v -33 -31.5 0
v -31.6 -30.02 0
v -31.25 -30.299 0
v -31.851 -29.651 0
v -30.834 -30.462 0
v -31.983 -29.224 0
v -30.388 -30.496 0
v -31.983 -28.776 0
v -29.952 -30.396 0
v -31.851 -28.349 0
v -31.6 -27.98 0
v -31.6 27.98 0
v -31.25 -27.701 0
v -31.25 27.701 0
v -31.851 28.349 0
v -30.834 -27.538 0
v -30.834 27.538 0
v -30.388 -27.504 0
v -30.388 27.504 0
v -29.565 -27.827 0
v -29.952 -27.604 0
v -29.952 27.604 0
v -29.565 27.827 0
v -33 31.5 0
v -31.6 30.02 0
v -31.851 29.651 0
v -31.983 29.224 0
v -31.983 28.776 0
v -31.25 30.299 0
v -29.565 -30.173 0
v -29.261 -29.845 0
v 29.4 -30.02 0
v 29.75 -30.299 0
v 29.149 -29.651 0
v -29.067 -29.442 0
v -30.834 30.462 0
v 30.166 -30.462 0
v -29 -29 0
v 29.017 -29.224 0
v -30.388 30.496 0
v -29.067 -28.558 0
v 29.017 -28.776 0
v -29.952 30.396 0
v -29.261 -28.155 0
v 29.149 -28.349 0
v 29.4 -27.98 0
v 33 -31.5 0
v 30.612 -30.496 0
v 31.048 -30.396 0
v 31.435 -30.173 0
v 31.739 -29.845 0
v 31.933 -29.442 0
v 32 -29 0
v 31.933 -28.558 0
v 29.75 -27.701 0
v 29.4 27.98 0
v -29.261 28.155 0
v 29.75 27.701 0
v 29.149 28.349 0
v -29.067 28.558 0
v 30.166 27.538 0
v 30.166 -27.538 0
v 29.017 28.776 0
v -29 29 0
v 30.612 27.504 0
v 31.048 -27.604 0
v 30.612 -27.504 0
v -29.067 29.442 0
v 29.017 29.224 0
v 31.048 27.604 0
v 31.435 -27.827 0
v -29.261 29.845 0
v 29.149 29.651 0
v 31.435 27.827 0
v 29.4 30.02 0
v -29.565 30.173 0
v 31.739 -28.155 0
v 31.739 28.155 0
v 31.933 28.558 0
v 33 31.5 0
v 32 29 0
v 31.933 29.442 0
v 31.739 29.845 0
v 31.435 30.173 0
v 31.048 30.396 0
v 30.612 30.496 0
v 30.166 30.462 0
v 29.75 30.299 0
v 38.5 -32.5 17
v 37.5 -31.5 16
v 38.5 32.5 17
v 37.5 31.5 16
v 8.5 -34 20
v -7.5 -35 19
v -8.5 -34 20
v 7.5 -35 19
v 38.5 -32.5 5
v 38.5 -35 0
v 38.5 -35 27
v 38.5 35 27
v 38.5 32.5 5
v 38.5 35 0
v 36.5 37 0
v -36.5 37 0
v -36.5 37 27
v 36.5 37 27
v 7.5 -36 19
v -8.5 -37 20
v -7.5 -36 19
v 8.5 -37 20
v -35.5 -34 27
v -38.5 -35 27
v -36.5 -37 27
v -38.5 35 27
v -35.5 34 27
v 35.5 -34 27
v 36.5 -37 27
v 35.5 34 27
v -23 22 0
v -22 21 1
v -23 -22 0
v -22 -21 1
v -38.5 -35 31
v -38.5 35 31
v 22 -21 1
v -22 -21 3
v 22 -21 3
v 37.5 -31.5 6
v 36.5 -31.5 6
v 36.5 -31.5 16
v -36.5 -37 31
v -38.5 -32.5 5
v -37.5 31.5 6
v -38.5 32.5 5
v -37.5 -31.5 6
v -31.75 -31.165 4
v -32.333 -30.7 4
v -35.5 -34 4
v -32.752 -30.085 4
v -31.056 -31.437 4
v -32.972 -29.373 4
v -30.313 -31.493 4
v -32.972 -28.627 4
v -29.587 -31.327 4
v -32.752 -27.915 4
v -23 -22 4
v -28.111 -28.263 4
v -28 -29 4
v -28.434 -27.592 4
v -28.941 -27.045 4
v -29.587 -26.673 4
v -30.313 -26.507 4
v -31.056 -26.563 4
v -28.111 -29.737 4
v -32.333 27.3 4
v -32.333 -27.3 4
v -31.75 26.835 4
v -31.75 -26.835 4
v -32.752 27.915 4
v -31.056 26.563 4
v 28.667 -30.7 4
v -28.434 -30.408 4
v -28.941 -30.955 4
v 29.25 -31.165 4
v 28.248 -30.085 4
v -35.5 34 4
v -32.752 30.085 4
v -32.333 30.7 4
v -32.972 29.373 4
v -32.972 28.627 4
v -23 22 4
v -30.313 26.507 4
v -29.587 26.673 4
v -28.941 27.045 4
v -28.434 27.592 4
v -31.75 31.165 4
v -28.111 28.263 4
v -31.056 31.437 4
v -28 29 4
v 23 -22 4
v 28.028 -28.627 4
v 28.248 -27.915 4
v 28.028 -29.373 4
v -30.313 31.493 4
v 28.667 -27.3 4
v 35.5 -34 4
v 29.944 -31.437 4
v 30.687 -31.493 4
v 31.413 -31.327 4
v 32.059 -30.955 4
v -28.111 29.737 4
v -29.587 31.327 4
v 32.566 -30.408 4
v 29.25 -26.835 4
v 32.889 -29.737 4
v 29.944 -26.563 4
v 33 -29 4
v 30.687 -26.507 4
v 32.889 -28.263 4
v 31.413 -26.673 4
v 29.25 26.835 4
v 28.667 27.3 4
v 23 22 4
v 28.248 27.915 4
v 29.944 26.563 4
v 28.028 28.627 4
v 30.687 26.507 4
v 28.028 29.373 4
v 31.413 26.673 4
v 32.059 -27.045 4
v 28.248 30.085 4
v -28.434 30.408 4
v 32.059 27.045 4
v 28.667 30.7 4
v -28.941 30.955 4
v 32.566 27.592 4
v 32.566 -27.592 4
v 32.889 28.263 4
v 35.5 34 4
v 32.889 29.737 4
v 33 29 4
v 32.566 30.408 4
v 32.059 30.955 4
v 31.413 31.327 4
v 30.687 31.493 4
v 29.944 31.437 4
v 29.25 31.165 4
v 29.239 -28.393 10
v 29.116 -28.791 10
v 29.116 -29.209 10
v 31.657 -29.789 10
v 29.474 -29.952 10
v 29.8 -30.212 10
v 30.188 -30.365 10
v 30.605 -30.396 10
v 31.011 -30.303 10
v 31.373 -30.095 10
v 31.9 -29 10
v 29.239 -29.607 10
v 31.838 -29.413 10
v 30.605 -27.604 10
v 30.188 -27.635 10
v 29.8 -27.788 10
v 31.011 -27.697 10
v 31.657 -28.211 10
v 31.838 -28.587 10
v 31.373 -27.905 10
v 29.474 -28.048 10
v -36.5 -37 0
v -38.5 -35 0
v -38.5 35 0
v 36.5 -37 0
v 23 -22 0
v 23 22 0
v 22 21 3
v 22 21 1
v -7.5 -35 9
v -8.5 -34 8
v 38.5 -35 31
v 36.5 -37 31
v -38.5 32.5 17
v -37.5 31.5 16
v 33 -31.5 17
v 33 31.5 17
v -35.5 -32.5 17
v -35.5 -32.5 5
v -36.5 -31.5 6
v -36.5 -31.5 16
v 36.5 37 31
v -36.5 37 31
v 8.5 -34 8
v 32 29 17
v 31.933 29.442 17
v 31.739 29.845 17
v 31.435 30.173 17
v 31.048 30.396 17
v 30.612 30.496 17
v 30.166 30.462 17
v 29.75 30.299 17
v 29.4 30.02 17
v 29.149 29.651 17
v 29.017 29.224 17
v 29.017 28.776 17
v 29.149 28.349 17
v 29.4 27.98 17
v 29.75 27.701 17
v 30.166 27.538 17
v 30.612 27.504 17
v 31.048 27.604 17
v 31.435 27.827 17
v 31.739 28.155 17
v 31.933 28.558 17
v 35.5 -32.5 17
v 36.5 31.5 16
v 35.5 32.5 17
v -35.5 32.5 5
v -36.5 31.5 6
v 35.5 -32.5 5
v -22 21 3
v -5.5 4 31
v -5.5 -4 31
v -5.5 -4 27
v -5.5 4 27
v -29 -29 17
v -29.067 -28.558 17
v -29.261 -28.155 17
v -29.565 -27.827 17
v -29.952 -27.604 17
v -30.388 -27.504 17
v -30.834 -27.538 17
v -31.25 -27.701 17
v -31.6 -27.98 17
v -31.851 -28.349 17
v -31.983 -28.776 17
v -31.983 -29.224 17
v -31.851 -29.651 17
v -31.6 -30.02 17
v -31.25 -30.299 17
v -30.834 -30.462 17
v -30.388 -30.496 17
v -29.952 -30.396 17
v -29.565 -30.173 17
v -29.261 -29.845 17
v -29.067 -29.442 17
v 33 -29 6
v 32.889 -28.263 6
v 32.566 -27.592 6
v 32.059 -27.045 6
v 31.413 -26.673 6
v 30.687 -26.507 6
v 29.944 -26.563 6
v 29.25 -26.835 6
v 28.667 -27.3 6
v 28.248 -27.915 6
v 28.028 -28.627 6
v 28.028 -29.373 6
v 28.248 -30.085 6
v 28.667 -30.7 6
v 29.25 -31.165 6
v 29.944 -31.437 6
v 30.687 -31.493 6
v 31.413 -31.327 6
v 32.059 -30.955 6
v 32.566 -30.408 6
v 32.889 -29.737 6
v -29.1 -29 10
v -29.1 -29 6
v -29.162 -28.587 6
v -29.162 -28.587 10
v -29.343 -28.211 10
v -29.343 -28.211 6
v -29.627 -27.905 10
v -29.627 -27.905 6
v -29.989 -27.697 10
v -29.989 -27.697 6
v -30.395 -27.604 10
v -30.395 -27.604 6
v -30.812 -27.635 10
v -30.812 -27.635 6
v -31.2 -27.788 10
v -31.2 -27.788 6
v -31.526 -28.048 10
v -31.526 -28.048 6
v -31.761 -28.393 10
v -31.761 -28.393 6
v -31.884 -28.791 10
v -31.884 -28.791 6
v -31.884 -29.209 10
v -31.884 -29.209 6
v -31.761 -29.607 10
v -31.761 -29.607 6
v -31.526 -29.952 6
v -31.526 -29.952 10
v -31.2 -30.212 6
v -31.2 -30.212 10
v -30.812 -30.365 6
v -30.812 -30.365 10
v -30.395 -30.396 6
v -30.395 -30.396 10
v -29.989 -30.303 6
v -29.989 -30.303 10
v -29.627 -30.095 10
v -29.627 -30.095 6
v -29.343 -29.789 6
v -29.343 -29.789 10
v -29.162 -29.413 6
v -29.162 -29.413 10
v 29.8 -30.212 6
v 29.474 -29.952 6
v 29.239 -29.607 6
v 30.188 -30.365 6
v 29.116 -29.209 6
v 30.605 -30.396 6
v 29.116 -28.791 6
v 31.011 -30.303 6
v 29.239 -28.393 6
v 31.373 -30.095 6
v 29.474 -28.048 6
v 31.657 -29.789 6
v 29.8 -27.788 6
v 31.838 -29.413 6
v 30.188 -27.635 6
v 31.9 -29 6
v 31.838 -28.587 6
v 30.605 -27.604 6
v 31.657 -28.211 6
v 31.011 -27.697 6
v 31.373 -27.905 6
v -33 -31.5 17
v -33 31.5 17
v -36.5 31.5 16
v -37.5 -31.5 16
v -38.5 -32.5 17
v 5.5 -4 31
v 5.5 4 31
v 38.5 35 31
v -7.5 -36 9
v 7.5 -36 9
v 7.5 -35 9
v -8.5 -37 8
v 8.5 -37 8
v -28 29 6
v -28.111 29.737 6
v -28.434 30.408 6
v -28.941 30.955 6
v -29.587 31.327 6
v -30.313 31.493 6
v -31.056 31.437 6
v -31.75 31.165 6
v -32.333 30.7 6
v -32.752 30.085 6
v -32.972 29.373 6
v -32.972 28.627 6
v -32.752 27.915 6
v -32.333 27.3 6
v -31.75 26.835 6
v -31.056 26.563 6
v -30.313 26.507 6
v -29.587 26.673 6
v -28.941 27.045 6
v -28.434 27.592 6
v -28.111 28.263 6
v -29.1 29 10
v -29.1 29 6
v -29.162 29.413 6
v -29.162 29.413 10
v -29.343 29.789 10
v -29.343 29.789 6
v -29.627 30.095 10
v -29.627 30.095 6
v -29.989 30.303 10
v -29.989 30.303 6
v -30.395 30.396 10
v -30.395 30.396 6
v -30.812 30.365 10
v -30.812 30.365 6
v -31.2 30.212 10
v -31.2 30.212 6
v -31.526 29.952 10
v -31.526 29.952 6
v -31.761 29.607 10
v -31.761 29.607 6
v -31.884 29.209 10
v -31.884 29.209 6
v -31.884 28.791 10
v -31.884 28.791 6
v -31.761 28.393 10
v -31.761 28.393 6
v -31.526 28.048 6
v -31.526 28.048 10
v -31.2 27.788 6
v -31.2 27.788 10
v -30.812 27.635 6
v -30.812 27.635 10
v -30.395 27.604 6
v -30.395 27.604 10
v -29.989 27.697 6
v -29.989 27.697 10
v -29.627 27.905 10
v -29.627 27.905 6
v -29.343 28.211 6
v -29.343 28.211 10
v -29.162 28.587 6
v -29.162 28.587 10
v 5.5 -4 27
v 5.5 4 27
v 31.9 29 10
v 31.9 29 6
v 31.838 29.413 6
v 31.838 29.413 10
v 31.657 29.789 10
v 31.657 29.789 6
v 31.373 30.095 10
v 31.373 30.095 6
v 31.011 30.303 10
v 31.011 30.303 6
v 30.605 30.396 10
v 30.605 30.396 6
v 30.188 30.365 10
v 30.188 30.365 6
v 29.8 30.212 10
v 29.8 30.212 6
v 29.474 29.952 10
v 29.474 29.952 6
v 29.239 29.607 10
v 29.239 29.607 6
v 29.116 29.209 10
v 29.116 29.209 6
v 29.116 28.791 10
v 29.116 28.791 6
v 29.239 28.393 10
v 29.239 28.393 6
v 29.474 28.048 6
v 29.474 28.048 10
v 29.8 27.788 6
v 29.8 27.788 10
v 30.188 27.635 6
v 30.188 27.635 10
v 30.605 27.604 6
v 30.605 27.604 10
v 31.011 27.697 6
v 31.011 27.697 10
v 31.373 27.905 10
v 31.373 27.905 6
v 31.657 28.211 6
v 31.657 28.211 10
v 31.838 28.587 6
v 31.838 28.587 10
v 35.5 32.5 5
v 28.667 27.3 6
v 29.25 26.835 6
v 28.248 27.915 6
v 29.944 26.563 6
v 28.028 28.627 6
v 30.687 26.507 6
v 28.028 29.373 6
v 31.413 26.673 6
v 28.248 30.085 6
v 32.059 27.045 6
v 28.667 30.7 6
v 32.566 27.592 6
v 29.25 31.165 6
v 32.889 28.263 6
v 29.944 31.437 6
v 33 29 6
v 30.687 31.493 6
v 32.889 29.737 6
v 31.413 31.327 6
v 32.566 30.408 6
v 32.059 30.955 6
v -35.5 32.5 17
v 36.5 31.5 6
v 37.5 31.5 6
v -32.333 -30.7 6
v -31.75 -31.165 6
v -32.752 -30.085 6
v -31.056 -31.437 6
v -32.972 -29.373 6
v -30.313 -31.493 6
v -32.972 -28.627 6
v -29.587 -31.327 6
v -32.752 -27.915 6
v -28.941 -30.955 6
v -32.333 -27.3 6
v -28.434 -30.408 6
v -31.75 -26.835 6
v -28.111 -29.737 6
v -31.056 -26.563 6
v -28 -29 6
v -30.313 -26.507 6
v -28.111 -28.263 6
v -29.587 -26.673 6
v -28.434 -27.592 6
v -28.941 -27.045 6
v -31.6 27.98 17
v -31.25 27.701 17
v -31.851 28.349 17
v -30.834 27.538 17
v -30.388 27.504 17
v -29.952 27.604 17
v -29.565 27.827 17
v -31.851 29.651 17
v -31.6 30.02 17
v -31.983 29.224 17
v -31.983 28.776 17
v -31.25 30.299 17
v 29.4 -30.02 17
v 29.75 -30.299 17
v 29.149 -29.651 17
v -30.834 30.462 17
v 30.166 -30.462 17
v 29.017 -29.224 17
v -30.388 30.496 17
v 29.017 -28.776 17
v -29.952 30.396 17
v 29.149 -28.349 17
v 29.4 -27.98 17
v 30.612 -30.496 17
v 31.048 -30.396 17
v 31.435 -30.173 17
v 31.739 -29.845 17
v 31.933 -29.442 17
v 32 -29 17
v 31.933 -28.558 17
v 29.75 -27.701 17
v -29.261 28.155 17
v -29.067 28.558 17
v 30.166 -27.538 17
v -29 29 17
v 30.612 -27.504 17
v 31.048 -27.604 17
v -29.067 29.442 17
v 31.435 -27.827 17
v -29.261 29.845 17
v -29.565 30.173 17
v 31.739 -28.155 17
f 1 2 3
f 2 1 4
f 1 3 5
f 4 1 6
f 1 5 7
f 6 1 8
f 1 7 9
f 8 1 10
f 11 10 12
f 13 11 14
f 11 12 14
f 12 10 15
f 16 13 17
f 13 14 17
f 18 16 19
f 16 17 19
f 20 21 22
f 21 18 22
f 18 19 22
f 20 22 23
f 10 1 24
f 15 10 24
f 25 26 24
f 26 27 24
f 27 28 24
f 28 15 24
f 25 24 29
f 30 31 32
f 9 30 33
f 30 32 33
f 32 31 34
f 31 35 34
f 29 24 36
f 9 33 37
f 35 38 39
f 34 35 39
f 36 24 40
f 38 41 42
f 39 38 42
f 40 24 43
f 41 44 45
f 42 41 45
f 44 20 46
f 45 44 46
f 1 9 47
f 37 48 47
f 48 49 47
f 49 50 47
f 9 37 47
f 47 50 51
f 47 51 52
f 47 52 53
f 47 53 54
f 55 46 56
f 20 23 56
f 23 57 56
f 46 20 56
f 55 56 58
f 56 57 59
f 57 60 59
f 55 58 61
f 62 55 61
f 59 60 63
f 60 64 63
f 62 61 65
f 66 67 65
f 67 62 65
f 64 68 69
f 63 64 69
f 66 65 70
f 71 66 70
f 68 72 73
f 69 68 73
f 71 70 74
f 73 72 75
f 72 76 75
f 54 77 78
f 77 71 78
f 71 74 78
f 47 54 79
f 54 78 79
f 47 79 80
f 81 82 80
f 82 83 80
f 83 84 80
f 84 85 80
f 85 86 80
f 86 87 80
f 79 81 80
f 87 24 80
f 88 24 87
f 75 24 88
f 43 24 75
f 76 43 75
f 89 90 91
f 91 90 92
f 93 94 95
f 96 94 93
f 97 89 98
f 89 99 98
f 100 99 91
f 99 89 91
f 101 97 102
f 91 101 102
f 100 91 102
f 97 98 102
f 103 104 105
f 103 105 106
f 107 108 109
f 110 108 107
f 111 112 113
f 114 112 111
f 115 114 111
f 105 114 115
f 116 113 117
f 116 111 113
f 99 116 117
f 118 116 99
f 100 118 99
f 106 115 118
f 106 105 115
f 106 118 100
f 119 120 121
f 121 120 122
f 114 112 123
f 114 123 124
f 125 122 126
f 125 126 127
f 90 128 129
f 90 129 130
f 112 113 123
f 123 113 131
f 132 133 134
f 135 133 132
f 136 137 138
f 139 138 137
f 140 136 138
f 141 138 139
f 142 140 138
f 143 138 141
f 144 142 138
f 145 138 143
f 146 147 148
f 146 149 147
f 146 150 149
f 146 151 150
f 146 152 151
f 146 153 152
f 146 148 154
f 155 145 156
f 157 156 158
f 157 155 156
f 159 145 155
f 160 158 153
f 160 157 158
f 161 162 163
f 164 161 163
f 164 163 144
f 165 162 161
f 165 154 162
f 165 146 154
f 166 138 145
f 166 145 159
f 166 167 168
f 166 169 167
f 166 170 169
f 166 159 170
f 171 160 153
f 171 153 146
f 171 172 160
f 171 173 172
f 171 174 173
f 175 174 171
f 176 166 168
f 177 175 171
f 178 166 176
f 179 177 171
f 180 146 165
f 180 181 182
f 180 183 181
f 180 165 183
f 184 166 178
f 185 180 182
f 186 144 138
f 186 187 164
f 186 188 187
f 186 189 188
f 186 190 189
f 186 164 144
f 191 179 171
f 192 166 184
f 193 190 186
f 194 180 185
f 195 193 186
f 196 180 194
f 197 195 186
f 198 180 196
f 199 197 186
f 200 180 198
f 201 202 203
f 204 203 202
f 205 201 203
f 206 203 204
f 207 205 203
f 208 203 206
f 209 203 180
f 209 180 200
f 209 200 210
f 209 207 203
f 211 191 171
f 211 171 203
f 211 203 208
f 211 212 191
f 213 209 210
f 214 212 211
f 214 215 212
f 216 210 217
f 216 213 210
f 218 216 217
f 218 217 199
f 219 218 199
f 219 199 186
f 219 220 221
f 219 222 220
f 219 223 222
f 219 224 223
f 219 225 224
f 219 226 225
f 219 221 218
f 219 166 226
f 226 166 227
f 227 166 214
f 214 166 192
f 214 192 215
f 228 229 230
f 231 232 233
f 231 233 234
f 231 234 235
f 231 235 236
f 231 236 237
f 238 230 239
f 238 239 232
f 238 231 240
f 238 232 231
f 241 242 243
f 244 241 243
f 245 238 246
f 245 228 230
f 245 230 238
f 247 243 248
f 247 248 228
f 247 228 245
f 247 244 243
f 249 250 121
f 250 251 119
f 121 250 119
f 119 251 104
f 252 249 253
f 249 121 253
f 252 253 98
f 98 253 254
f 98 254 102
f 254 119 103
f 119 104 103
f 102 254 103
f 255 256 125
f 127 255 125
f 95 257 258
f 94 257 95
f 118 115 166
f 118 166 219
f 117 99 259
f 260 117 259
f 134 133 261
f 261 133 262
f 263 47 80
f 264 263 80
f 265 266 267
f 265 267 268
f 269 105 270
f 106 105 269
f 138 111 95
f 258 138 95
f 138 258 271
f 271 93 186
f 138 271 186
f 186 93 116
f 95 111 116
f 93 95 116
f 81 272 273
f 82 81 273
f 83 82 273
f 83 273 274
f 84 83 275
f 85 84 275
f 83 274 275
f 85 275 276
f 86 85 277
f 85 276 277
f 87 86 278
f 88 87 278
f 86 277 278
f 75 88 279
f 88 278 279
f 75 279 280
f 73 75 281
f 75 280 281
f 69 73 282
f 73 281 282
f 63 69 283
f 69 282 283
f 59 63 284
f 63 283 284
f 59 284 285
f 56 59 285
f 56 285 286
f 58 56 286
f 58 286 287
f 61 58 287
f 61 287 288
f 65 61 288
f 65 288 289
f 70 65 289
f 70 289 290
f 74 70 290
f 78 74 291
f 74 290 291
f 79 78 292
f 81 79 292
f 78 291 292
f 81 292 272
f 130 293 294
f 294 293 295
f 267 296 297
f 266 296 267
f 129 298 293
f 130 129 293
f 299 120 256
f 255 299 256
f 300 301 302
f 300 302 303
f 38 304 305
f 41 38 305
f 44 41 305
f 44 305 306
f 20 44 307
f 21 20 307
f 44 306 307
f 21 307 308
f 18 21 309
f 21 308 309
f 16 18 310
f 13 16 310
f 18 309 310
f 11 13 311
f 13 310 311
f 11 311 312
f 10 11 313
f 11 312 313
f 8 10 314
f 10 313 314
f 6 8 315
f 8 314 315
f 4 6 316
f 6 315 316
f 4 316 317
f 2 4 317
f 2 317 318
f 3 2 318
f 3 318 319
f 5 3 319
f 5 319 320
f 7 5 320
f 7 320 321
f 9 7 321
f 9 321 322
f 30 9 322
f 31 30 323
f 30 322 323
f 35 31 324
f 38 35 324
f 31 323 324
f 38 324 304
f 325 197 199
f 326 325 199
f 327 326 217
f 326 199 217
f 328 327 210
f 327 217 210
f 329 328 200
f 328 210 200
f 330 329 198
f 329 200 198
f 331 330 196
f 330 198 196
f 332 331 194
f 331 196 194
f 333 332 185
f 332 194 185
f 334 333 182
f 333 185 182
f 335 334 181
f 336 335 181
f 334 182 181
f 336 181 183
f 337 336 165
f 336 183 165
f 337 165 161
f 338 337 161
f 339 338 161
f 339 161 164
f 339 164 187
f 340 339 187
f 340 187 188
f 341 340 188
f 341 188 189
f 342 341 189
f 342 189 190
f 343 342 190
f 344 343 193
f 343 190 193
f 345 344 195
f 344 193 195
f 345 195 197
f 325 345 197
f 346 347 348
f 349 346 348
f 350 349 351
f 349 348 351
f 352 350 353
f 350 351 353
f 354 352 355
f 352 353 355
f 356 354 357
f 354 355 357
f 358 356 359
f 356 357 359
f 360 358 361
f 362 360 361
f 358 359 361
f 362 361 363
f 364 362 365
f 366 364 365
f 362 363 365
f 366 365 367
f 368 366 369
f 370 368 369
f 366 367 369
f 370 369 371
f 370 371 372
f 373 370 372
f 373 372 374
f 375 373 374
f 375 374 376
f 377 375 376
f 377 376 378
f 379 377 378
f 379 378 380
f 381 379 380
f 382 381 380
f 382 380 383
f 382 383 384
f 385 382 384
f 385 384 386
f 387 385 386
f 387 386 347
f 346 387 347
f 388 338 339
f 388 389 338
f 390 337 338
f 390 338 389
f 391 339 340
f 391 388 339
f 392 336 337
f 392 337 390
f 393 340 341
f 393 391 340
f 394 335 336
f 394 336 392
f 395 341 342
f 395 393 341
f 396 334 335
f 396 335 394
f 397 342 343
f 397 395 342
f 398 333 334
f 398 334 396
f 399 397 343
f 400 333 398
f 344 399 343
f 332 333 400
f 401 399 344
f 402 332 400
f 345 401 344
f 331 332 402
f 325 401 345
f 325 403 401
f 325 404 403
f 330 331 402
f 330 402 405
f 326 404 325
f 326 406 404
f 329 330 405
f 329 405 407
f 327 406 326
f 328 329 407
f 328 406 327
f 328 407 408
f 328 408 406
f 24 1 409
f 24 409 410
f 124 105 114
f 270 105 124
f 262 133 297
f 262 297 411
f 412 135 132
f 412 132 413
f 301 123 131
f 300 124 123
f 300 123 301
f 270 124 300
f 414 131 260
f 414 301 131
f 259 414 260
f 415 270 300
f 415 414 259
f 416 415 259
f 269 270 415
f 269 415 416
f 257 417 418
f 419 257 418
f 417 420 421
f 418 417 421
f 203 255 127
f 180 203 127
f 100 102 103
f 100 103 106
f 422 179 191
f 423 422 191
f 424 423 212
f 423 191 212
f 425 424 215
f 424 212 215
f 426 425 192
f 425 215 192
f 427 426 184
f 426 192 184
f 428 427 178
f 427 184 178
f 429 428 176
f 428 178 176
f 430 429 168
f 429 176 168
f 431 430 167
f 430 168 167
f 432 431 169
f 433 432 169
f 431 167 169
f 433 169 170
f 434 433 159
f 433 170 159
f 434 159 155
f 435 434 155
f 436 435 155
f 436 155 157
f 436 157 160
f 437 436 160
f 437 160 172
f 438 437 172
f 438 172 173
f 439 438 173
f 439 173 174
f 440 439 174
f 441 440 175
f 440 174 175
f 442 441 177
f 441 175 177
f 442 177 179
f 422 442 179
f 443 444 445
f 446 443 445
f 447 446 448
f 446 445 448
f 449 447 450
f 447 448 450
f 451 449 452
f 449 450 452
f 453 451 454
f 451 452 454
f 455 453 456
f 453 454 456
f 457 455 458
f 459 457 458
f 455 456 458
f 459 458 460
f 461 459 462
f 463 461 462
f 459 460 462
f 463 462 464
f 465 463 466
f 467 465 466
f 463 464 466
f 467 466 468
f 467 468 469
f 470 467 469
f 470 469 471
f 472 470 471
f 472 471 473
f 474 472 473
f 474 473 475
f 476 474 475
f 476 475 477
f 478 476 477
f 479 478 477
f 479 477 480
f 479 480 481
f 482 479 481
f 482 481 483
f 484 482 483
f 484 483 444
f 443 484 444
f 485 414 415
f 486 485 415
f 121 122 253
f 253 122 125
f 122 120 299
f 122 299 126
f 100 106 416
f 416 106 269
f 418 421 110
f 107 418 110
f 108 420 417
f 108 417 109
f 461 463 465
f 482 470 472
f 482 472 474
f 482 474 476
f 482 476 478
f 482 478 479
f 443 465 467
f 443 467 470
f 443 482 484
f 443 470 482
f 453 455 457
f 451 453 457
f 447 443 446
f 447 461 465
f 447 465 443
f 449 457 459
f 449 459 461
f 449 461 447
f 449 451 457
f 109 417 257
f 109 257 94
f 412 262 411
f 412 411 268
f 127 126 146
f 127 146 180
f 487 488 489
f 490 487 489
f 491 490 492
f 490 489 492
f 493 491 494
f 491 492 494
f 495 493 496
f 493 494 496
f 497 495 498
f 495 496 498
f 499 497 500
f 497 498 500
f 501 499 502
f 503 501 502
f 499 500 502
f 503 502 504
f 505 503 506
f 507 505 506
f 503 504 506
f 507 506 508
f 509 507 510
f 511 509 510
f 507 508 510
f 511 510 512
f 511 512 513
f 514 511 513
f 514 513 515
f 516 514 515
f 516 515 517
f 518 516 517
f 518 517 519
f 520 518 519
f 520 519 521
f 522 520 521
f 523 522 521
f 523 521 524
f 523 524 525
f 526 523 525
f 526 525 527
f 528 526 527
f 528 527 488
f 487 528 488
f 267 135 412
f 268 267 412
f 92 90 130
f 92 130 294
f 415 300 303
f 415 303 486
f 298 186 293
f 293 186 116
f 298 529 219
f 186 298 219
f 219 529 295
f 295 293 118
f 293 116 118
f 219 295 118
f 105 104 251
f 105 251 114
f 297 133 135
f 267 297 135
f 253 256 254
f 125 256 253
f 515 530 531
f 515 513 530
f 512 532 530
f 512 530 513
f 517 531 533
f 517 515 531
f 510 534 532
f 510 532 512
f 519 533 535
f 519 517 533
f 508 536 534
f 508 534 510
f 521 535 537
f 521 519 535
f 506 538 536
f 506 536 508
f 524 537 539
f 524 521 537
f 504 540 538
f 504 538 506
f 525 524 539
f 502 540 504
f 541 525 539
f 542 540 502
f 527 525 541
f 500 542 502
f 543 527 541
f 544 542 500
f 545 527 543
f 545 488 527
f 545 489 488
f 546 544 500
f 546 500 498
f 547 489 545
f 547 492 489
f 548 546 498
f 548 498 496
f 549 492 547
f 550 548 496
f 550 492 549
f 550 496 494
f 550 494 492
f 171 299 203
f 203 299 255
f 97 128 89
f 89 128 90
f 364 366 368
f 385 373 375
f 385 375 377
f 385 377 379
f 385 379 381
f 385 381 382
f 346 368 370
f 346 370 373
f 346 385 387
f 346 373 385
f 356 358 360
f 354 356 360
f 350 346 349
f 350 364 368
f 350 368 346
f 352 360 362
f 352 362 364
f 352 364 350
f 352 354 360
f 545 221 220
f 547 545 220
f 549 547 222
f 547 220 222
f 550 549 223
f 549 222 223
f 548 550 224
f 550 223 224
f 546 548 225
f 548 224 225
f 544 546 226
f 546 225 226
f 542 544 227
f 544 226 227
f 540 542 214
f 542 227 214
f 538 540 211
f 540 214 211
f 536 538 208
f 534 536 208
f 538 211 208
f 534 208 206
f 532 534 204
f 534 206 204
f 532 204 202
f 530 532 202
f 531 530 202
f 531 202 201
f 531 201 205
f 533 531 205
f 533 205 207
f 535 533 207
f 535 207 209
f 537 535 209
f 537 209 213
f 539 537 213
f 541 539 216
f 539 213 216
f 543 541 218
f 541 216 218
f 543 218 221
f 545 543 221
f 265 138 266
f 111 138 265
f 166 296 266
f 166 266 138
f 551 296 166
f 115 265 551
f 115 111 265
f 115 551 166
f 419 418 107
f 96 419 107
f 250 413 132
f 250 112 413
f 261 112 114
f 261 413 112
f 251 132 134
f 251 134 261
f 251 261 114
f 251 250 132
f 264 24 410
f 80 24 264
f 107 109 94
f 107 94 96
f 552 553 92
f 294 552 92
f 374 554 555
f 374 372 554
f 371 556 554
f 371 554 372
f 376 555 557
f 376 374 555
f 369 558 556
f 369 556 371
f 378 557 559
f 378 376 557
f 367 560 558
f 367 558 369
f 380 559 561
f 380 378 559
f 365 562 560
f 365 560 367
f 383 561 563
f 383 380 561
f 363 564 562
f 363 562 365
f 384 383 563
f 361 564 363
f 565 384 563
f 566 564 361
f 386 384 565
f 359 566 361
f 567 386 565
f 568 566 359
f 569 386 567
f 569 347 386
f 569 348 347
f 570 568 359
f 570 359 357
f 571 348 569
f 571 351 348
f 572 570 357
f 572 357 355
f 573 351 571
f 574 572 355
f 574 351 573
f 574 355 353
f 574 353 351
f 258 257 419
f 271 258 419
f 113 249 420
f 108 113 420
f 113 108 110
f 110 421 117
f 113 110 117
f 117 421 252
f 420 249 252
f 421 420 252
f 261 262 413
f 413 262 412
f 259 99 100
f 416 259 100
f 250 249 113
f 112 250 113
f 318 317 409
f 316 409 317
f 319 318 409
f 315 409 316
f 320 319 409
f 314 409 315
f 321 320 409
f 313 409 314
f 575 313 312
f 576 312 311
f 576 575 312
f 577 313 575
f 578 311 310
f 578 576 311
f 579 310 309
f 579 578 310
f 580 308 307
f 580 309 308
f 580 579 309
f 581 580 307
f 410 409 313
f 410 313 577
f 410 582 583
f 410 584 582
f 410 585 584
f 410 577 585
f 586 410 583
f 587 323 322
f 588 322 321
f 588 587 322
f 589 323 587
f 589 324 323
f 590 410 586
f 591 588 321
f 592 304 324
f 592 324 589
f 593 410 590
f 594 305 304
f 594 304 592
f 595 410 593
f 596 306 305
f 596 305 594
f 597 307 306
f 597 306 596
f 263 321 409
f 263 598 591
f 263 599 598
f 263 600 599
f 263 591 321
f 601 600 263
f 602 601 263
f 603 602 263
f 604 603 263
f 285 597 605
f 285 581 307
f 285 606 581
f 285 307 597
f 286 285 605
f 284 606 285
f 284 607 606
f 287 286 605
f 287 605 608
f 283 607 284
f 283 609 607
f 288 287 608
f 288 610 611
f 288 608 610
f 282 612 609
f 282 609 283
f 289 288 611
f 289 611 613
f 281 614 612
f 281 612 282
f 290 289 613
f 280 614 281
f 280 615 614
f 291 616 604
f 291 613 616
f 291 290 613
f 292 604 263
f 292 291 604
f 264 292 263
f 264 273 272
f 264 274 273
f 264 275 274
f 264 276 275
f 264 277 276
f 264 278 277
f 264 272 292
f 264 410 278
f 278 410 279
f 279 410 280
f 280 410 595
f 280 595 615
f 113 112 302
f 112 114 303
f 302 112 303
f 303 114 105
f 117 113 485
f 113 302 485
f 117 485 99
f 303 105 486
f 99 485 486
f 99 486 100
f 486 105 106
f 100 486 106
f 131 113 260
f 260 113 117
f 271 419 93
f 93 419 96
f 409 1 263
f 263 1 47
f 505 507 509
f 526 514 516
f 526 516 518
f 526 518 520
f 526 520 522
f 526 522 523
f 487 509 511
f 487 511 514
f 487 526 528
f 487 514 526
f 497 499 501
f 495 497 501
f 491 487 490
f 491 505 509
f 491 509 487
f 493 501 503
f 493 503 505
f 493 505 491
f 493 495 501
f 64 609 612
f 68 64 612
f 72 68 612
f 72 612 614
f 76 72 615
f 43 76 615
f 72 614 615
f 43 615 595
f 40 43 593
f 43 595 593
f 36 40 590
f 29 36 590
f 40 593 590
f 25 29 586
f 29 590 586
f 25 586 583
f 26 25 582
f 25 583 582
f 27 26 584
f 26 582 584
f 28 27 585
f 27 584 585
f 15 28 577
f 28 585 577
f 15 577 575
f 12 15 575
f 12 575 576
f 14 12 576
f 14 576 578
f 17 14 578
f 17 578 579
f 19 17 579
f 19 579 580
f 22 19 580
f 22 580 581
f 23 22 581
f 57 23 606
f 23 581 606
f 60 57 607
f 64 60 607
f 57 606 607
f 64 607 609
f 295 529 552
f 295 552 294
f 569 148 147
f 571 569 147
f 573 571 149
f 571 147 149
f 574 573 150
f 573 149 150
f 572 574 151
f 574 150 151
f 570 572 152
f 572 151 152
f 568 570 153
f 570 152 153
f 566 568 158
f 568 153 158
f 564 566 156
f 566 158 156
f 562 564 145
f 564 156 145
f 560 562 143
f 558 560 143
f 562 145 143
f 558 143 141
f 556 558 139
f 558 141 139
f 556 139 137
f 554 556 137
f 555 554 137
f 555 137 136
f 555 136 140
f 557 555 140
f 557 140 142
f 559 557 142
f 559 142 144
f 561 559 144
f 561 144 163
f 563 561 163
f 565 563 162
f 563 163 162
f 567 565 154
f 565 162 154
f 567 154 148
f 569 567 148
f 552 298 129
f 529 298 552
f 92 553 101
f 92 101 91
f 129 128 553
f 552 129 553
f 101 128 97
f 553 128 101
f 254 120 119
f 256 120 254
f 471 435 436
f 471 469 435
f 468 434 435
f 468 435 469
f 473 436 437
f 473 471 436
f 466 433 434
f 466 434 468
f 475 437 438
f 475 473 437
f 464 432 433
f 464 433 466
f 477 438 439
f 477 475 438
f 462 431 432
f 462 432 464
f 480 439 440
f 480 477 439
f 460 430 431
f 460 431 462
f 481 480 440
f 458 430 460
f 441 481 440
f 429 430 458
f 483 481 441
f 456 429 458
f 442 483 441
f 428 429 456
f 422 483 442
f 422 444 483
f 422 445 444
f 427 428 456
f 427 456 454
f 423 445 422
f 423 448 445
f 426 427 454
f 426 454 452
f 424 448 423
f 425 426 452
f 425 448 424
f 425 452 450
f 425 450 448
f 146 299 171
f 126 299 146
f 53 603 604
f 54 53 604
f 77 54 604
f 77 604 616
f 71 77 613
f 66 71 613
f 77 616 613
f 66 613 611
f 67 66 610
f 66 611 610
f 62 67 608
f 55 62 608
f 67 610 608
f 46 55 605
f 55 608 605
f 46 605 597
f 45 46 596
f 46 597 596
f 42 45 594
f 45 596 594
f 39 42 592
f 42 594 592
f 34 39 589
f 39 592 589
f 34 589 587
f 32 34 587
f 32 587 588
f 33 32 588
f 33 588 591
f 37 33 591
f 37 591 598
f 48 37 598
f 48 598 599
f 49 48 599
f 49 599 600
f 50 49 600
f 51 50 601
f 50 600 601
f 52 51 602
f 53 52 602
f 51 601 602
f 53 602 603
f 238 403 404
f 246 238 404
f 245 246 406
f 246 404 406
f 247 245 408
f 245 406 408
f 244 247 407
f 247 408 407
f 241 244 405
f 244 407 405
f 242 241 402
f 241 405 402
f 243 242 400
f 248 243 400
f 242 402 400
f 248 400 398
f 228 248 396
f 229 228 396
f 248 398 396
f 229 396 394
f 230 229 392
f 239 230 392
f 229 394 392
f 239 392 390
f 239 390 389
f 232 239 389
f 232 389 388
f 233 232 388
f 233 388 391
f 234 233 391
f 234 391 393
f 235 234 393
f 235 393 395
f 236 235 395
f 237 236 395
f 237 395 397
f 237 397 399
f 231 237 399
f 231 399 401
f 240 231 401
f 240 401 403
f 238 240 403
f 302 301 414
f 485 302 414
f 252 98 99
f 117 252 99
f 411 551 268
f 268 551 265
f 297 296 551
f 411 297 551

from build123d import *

# Parameters (mm, degrees)
SKETCH_W        = 66
SKETCH_H        = 63
PAD_DEPTH       = 17
SKETCH001_R     = 1.5
POCKET_DEPTH    = 17
SKETCH002_R     = 1.5
POCKET001_DEPTH = 17
SKETCH003_R     = 1.5
POCKET002_DEPTH = 17
SKETCH004_R     = 1.5
POCKET003_DEPTH = 17
SKETCH005_W     = 77
SKETCH005_H     = 74
PAD001_DEPTH    = 27
SKETCH006_W     = 71
SKETCH006_H     = 68
POCKET004_DEPTH = 23
SKETCH007_R     = 2.5
PAD002_DEPTH    = 2
SKETCH008_R     = 2.5
PAD003_DEPTH    = 2
SKETCH009_R     = 2.5
PAD004_DEPTH    = 2
SKETCH010_R     = 2.5
PAD005_DEPTH    = 2
SKETCH011_R     = 1.4
PAD006_DEPTH    = 6
SKETCH012_R     = 1.4
PAD007_DEPTH    = 6
SKETCH013_R     = 1.4
PAD008_DEPTH    = 6
SKETCH014_R     = 1.4
PAD009_DEPTH    = 6
SKETCH015_W     = 63
SKETCH015_H     = 10
POCKET005_DEPTH = 3
SKETCH016_W     = 63
SKETCH016_H     = 10
POCKET006_DEPTH = 3
SKETCH017_W     = 15
SKETCH017_H     = 10
POCKET007_DEPTH = 3
SKETCH018_W     = 44
SKETCH018_H     = 42
POCKET008_DEPTH = 4
CHAMFER_SIZE    = 1
CHAMFER001_SIZE = 2
CHAMFER002_SIZE = 1
CHAMFER003_SIZE = 1
SKETCH019_W     = 77
SKETCH019_H     = 74
PAD010_DEPTH    = 4
CHAMFER004_SIZE = 2
SKETCH020_W     = 11
SKETCH020_H     = 8
POCKET009_DEPTH = 4


with BuildPart() as esp32_bb:
    # Sketch → Pad (new body)
    with BuildSketch(Plane.XY):
        Rectangle(SKETCH_W, SKETCH_H)
    extrude(amount=PAD_DEPTH)

    # Sketch001 (on Face6 of Pad) → Pocket (cut)
    with BuildSketch(Plane.XY.offset(17)):
        with Locations((30.5, 29)):
            Circle(SKETCH001_R)
    extrude(amount=-POCKET_DEPTH, mode=Mode.SUBTRACT)

    # Sketch002 (on Face5 of Pocket) → Pocket001 (cut)
    with BuildSketch(Plane.XY.offset(17)):
        with Locations((30.5, -29)):
            Circle(SKETCH002_R)
    extrude(amount=-POCKET001_DEPTH, mode=Mode.SUBTRACT)

    # Sketch003 (on Face5 of Pocket001) → Pocket002 (cut)
    with BuildSketch(Plane.XY.offset(17)):
        with Locations((-30.5, -29)):
            Circle(SKETCH003_R)
    extrude(amount=-POCKET002_DEPTH, mode=Mode.SUBTRACT)

    # Sketch004 (on Face5 of Pocket002) → Pocket003 (cut)
    with BuildSketch(Plane.XY.offset(17)):
        with Locations((-30.5, 29)):
            Circle(SKETCH004_R)
    extrude(amount=-POCKET003_DEPTH, mode=Mode.SUBTRACT)


with BuildPart() as esp32_housing:
    # Sketch005 → Pad001 (new body)
    with BuildSketch(Plane.XY):
        Rectangle(SKETCH005_W, SKETCH005_H)
    extrude(amount=PAD001_DEPTH)

    # Sketch006 (on Face6 of Pad001) → Pocket004 (cut)
    with BuildSketch(Plane.XY.offset(27)):
        Rectangle(SKETCH006_W, SKETCH006_H)
    extrude(amount=-POCKET004_DEPTH, mode=Mode.SUBTRACT)

    # Sketch007 (on Face11 of Pocket004) → Pad002 (join)
    with BuildSketch(Plane.XY.offset(4)):
        with Locations((30.5, 29)):
            Circle(SKETCH007_R)
    extrude(amount=PAD002_DEPTH)

    # Sketch008 (on Face11 of Pocket004) → Pad003 (join)
    with BuildSketch(Plane.XY.offset(4)):
        with Locations((30.5, -29)):
            Circle(SKETCH008_R)
    extrude(amount=PAD003_DEPTH)

    # Sketch009 (on Face11 of Pocket004) → Pad004 (join)
    with BuildSketch(Plane.XY.offset(4)):
        with Locations((-30.5, -29)):
            Circle(SKETCH009_R)
    extrude(amount=PAD004_DEPTH)

    # Sketch010 (on Face11 of Pocket004) → Pad005 (join)
    with BuildSketch(Plane.XY.offset(4)):
        with Locations((-30.5, 29)):
            Circle(SKETCH010_R)
    extrude(amount=PAD005_DEPTH)

    # Sketch011 (on Face11 of Pad005) → Pad006 (join)
    with BuildSketch(Plane.XY.offset(4)):
        with Locations((30.5, 29)):
            Circle(SKETCH011_R)
    extrude(amount=PAD006_DEPTH)

    # Sketch012 (on Face11 of Pad005) → Pad007 (join)
    with BuildSketch(Plane.XY.offset(4)):
        with Locations((30.5, -29)):
            Circle(SKETCH012_R)
    extrude(amount=PAD007_DEPTH)

    # Sketch013 (on Face11 of Pad005) → Pad008 (join)
    with BuildSketch(Plane.XY.offset(4)):
        with Locations((-30.5, -29)):
            Circle(SKETCH013_R)
    extrude(amount=PAD008_DEPTH)

    # Sketch014 (on Face11 of Pad005) → Pad009 (join)
    with BuildSketch(Plane.XY.offset(4)):
        with Locations((-30.5, 29)):
            Circle(SKETCH014_R)
    extrude(amount=PAD009_DEPTH)

    # Sketch015 (on Face1 of Pad009) → Pocket005 (cut)
    with BuildSketch(Plane(origin=(-38.5, 0, 0), x_dir=(0, -1, 0), z_dir=(-1, 0, 0))):
        with Locations((0, 11)):
            Rectangle(SKETCH015_W, SKETCH015_H)
    extrude(amount=-POCKET005_DEPTH, mode=Mode.SUBTRACT)

    # Sketch016 (on Face10 of Pocket005) → Pocket006 (cut)
    with BuildSketch(Plane.YZ.offset(38.5)):
        with Locations((0, 11)):
            Rectangle(SKETCH016_W, SKETCH016_H)
    extrude(amount=-POCKET006_DEPTH, mode=Mode.SUBTRACT)

    # Sketch017 (on Face5 of Pocket006) → Pocket007 (cut)
    with BuildSketch(Plane.XZ.offset(37)):
        with Locations((0, 14)):
            Rectangle(SKETCH017_W, SKETCH017_H)
    extrude(amount=-POCKET007_DEPTH, mode=Mode.SUBTRACT)

    # Sketch018 (on Face3 of Pocket007) → Pocket008 (cut)
    with BuildSketch(Plane(origin=(0, 0, 0), x_dir=(1, 0, 0), z_dir=(0, 0, -1))):
        Rectangle(SKETCH018_W, SKETCH018_H)
    extrude(amount=-POCKET008_DEPTH, mode=Mode.SUBTRACT)

    # Chamfer
    chamfer_edges = [esp32_housing.edges().sort_by_distance(p)[0] for p in [
        (0, -37, 9),
        (-7.5, -37, 14),
        (-7.5, -34, 14),
        (0, -34, 9),
        (0, -37, 19),
        (0, -34, 19),
        (7.5, -34, 14),
        (7.5, -37, 14),
    ]]
    chamfer(chamfer_edges, length=CHAMFER_SIZE)

    # Chamfer001
    chamfer001_edges = [esp32_housing.edges().sort_by_distance(p)[0] for p in [
        (-38.5, -37, 13.5),
        (38.5, -37, 13.5),
        (-38.5, 37, 13.5),
        (38.5, 37, 13.5),
    ]]
    chamfer(chamfer001_edges, length=CHAMFER001_SIZE)

    # Chamfer002
    chamfer002_edges = [esp32_housing.edges().sort_by_distance(p)[0] for p in [
        (22, 0, 0),
        (22, 0, 4),
        (0, 21, 0),
        (0, 21, 4),
        (-22, 0, 4),
        (-22, 0, 0),
        (0, -21, 0),
        (0, -21, 4),
    ]]
    chamfer(chamfer002_edges, length=CHAMFER002_SIZE)

    # Chamfer003
    chamfer003_edges = [esp32_housing.edges().sort_by_distance(p)[0] for p in [
        (-38.5, -31.5, 11),
        (-38.5, 0, 6),
        (-38.5, 0, 16),
        (-35.5, 0, 6),
        (-35.5, -31.5, 11),
        (-35.5, 0, 16),
        (-35.5, 31.5, 11),
        (-38.5, 31.5, 11),
        (38.5, 0, 6),
        (35.5, 0, 6),
        (35.5, 31.5, 11),
        (38.5, 31.5, 11),
        (35.5, 0, 16),
        (35.5, -31.5, 11),
        (38.5, -31.5, 11),
        (38.5, 0, 16),
    ]]
    chamfer(chamfer003_edges, length=CHAMFER003_SIZE)


with BuildPart() as esp32_housing_lid:
    # Sketch019 → Pad010 (new body)
    with BuildSketch(Plane.XY.offset(27)):
        Rectangle(SKETCH019_W, SKETCH019_H)
    extrude(amount=PAD010_DEPTH)

    # Chamfer004
    chamfer004_edges = [esp32_housing_lid.edges().sort_by_distance(p)[0] for p in [
        (-38.5, -37, 29),
        (38.5, -37, 29),
        (-38.5, 37, 29),
        (38.5, 37, 29),
    ]]
    chamfer(chamfer004_edges, length=CHAMFER004_SIZE)

    # Sketch020 (on Face5 of Chamfer004) → Pocket009 (cut)
    with BuildSketch(Plane.XY.offset(31)):
        Rectangle(SKETCH020_W, SKETCH020_H)
    extrude(amount=-POCKET009_DEPTH, mode=Mode.SUBTRACT)


solid = Compound([esp32_bb.part, esp32_housing.part, esp32_housing_lid.part])
